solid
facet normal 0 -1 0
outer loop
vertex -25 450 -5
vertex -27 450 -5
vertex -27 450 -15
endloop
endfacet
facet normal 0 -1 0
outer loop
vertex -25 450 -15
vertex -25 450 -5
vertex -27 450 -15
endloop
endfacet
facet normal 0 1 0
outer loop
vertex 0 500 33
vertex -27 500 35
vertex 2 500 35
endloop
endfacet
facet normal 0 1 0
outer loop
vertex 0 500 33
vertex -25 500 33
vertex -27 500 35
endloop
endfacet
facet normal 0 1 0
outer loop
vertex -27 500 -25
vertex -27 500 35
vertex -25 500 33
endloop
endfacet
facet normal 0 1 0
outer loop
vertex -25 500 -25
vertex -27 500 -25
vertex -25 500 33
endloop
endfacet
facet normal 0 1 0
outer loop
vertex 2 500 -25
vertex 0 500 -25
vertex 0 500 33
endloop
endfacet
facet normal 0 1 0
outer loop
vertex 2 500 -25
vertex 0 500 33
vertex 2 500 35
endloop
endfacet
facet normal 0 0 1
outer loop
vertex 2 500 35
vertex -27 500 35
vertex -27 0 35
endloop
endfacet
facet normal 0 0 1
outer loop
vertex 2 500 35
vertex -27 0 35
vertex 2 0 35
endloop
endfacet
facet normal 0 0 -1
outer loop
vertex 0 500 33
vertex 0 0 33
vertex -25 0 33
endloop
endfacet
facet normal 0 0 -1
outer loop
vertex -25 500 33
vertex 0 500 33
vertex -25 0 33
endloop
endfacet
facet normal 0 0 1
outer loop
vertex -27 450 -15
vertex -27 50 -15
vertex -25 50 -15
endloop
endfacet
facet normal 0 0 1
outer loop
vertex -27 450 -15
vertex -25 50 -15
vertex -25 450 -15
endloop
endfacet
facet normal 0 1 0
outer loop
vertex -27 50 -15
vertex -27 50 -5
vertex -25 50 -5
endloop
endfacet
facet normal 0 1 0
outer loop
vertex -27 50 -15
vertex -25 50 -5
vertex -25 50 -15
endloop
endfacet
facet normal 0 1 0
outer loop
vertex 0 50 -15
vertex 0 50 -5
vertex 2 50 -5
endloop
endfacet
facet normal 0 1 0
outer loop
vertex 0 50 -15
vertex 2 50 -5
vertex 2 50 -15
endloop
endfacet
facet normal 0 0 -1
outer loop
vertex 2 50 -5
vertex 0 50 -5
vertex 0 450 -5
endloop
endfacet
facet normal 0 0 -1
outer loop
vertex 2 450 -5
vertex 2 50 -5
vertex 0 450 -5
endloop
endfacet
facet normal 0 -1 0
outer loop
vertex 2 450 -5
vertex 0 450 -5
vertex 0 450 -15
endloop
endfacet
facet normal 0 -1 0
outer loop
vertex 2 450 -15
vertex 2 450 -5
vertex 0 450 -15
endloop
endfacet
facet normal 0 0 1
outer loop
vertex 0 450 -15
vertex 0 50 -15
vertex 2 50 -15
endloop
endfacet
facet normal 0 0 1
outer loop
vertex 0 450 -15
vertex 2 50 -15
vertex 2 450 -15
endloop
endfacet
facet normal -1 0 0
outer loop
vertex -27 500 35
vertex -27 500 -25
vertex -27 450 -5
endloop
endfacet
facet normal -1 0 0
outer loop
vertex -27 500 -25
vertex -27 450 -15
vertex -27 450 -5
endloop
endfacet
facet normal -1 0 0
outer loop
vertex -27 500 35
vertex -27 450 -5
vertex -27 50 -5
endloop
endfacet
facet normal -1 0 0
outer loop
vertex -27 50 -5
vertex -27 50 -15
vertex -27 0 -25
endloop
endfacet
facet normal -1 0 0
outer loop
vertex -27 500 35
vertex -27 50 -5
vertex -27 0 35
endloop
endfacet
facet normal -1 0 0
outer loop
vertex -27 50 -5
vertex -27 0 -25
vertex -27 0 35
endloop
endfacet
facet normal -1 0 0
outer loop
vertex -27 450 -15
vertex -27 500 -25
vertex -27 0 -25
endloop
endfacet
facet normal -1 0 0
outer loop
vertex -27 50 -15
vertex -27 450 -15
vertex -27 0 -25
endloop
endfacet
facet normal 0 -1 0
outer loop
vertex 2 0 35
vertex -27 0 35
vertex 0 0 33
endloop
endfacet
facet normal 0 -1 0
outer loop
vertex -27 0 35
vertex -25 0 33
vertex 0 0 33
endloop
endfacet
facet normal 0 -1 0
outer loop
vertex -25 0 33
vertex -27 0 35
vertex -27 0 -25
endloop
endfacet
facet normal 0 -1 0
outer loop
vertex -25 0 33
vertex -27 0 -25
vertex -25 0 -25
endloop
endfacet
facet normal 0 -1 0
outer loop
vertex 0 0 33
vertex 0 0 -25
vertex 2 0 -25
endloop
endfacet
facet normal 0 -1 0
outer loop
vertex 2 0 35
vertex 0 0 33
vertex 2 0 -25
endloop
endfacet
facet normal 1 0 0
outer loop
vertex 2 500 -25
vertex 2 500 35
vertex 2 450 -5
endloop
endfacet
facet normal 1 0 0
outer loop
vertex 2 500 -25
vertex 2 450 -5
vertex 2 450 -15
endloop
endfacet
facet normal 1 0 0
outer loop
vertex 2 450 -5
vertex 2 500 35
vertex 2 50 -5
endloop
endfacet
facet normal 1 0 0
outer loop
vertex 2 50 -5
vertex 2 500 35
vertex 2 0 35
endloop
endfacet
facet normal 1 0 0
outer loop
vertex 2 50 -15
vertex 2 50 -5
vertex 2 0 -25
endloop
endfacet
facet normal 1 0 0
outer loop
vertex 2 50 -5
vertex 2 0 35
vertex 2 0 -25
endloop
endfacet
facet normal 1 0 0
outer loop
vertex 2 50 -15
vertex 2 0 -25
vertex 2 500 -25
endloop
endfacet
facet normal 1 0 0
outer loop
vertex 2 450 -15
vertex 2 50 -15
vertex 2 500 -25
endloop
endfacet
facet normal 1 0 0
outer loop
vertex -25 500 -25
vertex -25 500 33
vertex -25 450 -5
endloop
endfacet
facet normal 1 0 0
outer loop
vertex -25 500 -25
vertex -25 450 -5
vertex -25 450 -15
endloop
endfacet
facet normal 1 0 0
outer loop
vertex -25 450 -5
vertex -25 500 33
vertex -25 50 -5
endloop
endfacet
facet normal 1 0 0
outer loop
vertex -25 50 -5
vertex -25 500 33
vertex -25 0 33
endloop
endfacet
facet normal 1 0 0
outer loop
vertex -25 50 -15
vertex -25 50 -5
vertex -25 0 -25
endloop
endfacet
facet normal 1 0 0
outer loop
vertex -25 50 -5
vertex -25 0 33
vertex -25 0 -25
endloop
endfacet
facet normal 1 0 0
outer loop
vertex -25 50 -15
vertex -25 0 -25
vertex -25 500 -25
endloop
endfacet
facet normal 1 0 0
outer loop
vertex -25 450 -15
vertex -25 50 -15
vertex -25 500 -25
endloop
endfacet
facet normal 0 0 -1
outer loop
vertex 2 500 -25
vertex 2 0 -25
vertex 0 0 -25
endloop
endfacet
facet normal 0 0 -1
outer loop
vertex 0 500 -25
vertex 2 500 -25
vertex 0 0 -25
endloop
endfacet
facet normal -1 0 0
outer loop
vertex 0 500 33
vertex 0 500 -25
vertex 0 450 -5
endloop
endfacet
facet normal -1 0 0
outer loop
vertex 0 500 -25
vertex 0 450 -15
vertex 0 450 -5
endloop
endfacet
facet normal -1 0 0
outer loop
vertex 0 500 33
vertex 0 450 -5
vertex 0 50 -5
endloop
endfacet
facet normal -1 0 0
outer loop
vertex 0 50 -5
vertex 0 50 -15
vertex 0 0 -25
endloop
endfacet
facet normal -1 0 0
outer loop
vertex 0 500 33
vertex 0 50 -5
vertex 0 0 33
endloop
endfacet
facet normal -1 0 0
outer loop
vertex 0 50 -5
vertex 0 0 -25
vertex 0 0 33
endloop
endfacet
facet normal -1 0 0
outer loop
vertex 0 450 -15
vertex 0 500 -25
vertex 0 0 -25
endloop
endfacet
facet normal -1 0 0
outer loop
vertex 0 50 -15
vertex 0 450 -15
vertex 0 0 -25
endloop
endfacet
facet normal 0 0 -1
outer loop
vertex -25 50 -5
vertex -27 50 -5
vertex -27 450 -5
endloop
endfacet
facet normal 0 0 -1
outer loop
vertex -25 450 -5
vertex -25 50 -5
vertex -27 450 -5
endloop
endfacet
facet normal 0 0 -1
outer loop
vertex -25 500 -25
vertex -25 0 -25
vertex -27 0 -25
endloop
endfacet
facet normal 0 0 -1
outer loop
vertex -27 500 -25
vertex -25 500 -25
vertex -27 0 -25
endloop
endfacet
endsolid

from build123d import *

# Parameters (mm, degrees)
BOSS_EXTRUDE1_DEPTH     = 500
CUT_EXTRUDE1_DEPTH      = 503.06174919
CUT_EXTRUDE1_DEPTH_BACK = 503.06174919
SKETCH2_W               = 10
SKETCH2_H               = 400


with BuildPart() as part:
    # Sketch1 → Boss-Extrude1 (new body)
    with BuildSketch(Plane(origin=(0, 0, 0), x_dir=(1, 0, 0), z_dir=(0, 1, 0))):
        Polygon((-25, -33), (-25, 25), (-27, 25), (-27, -35), (2, -35), (2, 25), (0, 25), (0, -33), align=None)
    extrude(amount=BOSS_EXTRUDE1_DEPTH)

    # Sketch2 → Cut-Extrude1 (cut, two sides: drawn at the far end of the back side and taken through both)
    with BuildSketch(Plane(origin=(2, 0, 0), x_dir=(0, 0, -1), z_dir=(1, 0, 0)).offset(-CUT_EXTRUDE1_DEPTH_BACK)):
        with Locations((10, 250)):
            Rectangle(SKETCH2_W, SKETCH2_H)
    extrude(amount=CUT_EXTRUDE1_DEPTH + CUT_EXTRUDE1_DEPTH_BACK, mode=Mode.SUBTRACT)


solid = part.part
